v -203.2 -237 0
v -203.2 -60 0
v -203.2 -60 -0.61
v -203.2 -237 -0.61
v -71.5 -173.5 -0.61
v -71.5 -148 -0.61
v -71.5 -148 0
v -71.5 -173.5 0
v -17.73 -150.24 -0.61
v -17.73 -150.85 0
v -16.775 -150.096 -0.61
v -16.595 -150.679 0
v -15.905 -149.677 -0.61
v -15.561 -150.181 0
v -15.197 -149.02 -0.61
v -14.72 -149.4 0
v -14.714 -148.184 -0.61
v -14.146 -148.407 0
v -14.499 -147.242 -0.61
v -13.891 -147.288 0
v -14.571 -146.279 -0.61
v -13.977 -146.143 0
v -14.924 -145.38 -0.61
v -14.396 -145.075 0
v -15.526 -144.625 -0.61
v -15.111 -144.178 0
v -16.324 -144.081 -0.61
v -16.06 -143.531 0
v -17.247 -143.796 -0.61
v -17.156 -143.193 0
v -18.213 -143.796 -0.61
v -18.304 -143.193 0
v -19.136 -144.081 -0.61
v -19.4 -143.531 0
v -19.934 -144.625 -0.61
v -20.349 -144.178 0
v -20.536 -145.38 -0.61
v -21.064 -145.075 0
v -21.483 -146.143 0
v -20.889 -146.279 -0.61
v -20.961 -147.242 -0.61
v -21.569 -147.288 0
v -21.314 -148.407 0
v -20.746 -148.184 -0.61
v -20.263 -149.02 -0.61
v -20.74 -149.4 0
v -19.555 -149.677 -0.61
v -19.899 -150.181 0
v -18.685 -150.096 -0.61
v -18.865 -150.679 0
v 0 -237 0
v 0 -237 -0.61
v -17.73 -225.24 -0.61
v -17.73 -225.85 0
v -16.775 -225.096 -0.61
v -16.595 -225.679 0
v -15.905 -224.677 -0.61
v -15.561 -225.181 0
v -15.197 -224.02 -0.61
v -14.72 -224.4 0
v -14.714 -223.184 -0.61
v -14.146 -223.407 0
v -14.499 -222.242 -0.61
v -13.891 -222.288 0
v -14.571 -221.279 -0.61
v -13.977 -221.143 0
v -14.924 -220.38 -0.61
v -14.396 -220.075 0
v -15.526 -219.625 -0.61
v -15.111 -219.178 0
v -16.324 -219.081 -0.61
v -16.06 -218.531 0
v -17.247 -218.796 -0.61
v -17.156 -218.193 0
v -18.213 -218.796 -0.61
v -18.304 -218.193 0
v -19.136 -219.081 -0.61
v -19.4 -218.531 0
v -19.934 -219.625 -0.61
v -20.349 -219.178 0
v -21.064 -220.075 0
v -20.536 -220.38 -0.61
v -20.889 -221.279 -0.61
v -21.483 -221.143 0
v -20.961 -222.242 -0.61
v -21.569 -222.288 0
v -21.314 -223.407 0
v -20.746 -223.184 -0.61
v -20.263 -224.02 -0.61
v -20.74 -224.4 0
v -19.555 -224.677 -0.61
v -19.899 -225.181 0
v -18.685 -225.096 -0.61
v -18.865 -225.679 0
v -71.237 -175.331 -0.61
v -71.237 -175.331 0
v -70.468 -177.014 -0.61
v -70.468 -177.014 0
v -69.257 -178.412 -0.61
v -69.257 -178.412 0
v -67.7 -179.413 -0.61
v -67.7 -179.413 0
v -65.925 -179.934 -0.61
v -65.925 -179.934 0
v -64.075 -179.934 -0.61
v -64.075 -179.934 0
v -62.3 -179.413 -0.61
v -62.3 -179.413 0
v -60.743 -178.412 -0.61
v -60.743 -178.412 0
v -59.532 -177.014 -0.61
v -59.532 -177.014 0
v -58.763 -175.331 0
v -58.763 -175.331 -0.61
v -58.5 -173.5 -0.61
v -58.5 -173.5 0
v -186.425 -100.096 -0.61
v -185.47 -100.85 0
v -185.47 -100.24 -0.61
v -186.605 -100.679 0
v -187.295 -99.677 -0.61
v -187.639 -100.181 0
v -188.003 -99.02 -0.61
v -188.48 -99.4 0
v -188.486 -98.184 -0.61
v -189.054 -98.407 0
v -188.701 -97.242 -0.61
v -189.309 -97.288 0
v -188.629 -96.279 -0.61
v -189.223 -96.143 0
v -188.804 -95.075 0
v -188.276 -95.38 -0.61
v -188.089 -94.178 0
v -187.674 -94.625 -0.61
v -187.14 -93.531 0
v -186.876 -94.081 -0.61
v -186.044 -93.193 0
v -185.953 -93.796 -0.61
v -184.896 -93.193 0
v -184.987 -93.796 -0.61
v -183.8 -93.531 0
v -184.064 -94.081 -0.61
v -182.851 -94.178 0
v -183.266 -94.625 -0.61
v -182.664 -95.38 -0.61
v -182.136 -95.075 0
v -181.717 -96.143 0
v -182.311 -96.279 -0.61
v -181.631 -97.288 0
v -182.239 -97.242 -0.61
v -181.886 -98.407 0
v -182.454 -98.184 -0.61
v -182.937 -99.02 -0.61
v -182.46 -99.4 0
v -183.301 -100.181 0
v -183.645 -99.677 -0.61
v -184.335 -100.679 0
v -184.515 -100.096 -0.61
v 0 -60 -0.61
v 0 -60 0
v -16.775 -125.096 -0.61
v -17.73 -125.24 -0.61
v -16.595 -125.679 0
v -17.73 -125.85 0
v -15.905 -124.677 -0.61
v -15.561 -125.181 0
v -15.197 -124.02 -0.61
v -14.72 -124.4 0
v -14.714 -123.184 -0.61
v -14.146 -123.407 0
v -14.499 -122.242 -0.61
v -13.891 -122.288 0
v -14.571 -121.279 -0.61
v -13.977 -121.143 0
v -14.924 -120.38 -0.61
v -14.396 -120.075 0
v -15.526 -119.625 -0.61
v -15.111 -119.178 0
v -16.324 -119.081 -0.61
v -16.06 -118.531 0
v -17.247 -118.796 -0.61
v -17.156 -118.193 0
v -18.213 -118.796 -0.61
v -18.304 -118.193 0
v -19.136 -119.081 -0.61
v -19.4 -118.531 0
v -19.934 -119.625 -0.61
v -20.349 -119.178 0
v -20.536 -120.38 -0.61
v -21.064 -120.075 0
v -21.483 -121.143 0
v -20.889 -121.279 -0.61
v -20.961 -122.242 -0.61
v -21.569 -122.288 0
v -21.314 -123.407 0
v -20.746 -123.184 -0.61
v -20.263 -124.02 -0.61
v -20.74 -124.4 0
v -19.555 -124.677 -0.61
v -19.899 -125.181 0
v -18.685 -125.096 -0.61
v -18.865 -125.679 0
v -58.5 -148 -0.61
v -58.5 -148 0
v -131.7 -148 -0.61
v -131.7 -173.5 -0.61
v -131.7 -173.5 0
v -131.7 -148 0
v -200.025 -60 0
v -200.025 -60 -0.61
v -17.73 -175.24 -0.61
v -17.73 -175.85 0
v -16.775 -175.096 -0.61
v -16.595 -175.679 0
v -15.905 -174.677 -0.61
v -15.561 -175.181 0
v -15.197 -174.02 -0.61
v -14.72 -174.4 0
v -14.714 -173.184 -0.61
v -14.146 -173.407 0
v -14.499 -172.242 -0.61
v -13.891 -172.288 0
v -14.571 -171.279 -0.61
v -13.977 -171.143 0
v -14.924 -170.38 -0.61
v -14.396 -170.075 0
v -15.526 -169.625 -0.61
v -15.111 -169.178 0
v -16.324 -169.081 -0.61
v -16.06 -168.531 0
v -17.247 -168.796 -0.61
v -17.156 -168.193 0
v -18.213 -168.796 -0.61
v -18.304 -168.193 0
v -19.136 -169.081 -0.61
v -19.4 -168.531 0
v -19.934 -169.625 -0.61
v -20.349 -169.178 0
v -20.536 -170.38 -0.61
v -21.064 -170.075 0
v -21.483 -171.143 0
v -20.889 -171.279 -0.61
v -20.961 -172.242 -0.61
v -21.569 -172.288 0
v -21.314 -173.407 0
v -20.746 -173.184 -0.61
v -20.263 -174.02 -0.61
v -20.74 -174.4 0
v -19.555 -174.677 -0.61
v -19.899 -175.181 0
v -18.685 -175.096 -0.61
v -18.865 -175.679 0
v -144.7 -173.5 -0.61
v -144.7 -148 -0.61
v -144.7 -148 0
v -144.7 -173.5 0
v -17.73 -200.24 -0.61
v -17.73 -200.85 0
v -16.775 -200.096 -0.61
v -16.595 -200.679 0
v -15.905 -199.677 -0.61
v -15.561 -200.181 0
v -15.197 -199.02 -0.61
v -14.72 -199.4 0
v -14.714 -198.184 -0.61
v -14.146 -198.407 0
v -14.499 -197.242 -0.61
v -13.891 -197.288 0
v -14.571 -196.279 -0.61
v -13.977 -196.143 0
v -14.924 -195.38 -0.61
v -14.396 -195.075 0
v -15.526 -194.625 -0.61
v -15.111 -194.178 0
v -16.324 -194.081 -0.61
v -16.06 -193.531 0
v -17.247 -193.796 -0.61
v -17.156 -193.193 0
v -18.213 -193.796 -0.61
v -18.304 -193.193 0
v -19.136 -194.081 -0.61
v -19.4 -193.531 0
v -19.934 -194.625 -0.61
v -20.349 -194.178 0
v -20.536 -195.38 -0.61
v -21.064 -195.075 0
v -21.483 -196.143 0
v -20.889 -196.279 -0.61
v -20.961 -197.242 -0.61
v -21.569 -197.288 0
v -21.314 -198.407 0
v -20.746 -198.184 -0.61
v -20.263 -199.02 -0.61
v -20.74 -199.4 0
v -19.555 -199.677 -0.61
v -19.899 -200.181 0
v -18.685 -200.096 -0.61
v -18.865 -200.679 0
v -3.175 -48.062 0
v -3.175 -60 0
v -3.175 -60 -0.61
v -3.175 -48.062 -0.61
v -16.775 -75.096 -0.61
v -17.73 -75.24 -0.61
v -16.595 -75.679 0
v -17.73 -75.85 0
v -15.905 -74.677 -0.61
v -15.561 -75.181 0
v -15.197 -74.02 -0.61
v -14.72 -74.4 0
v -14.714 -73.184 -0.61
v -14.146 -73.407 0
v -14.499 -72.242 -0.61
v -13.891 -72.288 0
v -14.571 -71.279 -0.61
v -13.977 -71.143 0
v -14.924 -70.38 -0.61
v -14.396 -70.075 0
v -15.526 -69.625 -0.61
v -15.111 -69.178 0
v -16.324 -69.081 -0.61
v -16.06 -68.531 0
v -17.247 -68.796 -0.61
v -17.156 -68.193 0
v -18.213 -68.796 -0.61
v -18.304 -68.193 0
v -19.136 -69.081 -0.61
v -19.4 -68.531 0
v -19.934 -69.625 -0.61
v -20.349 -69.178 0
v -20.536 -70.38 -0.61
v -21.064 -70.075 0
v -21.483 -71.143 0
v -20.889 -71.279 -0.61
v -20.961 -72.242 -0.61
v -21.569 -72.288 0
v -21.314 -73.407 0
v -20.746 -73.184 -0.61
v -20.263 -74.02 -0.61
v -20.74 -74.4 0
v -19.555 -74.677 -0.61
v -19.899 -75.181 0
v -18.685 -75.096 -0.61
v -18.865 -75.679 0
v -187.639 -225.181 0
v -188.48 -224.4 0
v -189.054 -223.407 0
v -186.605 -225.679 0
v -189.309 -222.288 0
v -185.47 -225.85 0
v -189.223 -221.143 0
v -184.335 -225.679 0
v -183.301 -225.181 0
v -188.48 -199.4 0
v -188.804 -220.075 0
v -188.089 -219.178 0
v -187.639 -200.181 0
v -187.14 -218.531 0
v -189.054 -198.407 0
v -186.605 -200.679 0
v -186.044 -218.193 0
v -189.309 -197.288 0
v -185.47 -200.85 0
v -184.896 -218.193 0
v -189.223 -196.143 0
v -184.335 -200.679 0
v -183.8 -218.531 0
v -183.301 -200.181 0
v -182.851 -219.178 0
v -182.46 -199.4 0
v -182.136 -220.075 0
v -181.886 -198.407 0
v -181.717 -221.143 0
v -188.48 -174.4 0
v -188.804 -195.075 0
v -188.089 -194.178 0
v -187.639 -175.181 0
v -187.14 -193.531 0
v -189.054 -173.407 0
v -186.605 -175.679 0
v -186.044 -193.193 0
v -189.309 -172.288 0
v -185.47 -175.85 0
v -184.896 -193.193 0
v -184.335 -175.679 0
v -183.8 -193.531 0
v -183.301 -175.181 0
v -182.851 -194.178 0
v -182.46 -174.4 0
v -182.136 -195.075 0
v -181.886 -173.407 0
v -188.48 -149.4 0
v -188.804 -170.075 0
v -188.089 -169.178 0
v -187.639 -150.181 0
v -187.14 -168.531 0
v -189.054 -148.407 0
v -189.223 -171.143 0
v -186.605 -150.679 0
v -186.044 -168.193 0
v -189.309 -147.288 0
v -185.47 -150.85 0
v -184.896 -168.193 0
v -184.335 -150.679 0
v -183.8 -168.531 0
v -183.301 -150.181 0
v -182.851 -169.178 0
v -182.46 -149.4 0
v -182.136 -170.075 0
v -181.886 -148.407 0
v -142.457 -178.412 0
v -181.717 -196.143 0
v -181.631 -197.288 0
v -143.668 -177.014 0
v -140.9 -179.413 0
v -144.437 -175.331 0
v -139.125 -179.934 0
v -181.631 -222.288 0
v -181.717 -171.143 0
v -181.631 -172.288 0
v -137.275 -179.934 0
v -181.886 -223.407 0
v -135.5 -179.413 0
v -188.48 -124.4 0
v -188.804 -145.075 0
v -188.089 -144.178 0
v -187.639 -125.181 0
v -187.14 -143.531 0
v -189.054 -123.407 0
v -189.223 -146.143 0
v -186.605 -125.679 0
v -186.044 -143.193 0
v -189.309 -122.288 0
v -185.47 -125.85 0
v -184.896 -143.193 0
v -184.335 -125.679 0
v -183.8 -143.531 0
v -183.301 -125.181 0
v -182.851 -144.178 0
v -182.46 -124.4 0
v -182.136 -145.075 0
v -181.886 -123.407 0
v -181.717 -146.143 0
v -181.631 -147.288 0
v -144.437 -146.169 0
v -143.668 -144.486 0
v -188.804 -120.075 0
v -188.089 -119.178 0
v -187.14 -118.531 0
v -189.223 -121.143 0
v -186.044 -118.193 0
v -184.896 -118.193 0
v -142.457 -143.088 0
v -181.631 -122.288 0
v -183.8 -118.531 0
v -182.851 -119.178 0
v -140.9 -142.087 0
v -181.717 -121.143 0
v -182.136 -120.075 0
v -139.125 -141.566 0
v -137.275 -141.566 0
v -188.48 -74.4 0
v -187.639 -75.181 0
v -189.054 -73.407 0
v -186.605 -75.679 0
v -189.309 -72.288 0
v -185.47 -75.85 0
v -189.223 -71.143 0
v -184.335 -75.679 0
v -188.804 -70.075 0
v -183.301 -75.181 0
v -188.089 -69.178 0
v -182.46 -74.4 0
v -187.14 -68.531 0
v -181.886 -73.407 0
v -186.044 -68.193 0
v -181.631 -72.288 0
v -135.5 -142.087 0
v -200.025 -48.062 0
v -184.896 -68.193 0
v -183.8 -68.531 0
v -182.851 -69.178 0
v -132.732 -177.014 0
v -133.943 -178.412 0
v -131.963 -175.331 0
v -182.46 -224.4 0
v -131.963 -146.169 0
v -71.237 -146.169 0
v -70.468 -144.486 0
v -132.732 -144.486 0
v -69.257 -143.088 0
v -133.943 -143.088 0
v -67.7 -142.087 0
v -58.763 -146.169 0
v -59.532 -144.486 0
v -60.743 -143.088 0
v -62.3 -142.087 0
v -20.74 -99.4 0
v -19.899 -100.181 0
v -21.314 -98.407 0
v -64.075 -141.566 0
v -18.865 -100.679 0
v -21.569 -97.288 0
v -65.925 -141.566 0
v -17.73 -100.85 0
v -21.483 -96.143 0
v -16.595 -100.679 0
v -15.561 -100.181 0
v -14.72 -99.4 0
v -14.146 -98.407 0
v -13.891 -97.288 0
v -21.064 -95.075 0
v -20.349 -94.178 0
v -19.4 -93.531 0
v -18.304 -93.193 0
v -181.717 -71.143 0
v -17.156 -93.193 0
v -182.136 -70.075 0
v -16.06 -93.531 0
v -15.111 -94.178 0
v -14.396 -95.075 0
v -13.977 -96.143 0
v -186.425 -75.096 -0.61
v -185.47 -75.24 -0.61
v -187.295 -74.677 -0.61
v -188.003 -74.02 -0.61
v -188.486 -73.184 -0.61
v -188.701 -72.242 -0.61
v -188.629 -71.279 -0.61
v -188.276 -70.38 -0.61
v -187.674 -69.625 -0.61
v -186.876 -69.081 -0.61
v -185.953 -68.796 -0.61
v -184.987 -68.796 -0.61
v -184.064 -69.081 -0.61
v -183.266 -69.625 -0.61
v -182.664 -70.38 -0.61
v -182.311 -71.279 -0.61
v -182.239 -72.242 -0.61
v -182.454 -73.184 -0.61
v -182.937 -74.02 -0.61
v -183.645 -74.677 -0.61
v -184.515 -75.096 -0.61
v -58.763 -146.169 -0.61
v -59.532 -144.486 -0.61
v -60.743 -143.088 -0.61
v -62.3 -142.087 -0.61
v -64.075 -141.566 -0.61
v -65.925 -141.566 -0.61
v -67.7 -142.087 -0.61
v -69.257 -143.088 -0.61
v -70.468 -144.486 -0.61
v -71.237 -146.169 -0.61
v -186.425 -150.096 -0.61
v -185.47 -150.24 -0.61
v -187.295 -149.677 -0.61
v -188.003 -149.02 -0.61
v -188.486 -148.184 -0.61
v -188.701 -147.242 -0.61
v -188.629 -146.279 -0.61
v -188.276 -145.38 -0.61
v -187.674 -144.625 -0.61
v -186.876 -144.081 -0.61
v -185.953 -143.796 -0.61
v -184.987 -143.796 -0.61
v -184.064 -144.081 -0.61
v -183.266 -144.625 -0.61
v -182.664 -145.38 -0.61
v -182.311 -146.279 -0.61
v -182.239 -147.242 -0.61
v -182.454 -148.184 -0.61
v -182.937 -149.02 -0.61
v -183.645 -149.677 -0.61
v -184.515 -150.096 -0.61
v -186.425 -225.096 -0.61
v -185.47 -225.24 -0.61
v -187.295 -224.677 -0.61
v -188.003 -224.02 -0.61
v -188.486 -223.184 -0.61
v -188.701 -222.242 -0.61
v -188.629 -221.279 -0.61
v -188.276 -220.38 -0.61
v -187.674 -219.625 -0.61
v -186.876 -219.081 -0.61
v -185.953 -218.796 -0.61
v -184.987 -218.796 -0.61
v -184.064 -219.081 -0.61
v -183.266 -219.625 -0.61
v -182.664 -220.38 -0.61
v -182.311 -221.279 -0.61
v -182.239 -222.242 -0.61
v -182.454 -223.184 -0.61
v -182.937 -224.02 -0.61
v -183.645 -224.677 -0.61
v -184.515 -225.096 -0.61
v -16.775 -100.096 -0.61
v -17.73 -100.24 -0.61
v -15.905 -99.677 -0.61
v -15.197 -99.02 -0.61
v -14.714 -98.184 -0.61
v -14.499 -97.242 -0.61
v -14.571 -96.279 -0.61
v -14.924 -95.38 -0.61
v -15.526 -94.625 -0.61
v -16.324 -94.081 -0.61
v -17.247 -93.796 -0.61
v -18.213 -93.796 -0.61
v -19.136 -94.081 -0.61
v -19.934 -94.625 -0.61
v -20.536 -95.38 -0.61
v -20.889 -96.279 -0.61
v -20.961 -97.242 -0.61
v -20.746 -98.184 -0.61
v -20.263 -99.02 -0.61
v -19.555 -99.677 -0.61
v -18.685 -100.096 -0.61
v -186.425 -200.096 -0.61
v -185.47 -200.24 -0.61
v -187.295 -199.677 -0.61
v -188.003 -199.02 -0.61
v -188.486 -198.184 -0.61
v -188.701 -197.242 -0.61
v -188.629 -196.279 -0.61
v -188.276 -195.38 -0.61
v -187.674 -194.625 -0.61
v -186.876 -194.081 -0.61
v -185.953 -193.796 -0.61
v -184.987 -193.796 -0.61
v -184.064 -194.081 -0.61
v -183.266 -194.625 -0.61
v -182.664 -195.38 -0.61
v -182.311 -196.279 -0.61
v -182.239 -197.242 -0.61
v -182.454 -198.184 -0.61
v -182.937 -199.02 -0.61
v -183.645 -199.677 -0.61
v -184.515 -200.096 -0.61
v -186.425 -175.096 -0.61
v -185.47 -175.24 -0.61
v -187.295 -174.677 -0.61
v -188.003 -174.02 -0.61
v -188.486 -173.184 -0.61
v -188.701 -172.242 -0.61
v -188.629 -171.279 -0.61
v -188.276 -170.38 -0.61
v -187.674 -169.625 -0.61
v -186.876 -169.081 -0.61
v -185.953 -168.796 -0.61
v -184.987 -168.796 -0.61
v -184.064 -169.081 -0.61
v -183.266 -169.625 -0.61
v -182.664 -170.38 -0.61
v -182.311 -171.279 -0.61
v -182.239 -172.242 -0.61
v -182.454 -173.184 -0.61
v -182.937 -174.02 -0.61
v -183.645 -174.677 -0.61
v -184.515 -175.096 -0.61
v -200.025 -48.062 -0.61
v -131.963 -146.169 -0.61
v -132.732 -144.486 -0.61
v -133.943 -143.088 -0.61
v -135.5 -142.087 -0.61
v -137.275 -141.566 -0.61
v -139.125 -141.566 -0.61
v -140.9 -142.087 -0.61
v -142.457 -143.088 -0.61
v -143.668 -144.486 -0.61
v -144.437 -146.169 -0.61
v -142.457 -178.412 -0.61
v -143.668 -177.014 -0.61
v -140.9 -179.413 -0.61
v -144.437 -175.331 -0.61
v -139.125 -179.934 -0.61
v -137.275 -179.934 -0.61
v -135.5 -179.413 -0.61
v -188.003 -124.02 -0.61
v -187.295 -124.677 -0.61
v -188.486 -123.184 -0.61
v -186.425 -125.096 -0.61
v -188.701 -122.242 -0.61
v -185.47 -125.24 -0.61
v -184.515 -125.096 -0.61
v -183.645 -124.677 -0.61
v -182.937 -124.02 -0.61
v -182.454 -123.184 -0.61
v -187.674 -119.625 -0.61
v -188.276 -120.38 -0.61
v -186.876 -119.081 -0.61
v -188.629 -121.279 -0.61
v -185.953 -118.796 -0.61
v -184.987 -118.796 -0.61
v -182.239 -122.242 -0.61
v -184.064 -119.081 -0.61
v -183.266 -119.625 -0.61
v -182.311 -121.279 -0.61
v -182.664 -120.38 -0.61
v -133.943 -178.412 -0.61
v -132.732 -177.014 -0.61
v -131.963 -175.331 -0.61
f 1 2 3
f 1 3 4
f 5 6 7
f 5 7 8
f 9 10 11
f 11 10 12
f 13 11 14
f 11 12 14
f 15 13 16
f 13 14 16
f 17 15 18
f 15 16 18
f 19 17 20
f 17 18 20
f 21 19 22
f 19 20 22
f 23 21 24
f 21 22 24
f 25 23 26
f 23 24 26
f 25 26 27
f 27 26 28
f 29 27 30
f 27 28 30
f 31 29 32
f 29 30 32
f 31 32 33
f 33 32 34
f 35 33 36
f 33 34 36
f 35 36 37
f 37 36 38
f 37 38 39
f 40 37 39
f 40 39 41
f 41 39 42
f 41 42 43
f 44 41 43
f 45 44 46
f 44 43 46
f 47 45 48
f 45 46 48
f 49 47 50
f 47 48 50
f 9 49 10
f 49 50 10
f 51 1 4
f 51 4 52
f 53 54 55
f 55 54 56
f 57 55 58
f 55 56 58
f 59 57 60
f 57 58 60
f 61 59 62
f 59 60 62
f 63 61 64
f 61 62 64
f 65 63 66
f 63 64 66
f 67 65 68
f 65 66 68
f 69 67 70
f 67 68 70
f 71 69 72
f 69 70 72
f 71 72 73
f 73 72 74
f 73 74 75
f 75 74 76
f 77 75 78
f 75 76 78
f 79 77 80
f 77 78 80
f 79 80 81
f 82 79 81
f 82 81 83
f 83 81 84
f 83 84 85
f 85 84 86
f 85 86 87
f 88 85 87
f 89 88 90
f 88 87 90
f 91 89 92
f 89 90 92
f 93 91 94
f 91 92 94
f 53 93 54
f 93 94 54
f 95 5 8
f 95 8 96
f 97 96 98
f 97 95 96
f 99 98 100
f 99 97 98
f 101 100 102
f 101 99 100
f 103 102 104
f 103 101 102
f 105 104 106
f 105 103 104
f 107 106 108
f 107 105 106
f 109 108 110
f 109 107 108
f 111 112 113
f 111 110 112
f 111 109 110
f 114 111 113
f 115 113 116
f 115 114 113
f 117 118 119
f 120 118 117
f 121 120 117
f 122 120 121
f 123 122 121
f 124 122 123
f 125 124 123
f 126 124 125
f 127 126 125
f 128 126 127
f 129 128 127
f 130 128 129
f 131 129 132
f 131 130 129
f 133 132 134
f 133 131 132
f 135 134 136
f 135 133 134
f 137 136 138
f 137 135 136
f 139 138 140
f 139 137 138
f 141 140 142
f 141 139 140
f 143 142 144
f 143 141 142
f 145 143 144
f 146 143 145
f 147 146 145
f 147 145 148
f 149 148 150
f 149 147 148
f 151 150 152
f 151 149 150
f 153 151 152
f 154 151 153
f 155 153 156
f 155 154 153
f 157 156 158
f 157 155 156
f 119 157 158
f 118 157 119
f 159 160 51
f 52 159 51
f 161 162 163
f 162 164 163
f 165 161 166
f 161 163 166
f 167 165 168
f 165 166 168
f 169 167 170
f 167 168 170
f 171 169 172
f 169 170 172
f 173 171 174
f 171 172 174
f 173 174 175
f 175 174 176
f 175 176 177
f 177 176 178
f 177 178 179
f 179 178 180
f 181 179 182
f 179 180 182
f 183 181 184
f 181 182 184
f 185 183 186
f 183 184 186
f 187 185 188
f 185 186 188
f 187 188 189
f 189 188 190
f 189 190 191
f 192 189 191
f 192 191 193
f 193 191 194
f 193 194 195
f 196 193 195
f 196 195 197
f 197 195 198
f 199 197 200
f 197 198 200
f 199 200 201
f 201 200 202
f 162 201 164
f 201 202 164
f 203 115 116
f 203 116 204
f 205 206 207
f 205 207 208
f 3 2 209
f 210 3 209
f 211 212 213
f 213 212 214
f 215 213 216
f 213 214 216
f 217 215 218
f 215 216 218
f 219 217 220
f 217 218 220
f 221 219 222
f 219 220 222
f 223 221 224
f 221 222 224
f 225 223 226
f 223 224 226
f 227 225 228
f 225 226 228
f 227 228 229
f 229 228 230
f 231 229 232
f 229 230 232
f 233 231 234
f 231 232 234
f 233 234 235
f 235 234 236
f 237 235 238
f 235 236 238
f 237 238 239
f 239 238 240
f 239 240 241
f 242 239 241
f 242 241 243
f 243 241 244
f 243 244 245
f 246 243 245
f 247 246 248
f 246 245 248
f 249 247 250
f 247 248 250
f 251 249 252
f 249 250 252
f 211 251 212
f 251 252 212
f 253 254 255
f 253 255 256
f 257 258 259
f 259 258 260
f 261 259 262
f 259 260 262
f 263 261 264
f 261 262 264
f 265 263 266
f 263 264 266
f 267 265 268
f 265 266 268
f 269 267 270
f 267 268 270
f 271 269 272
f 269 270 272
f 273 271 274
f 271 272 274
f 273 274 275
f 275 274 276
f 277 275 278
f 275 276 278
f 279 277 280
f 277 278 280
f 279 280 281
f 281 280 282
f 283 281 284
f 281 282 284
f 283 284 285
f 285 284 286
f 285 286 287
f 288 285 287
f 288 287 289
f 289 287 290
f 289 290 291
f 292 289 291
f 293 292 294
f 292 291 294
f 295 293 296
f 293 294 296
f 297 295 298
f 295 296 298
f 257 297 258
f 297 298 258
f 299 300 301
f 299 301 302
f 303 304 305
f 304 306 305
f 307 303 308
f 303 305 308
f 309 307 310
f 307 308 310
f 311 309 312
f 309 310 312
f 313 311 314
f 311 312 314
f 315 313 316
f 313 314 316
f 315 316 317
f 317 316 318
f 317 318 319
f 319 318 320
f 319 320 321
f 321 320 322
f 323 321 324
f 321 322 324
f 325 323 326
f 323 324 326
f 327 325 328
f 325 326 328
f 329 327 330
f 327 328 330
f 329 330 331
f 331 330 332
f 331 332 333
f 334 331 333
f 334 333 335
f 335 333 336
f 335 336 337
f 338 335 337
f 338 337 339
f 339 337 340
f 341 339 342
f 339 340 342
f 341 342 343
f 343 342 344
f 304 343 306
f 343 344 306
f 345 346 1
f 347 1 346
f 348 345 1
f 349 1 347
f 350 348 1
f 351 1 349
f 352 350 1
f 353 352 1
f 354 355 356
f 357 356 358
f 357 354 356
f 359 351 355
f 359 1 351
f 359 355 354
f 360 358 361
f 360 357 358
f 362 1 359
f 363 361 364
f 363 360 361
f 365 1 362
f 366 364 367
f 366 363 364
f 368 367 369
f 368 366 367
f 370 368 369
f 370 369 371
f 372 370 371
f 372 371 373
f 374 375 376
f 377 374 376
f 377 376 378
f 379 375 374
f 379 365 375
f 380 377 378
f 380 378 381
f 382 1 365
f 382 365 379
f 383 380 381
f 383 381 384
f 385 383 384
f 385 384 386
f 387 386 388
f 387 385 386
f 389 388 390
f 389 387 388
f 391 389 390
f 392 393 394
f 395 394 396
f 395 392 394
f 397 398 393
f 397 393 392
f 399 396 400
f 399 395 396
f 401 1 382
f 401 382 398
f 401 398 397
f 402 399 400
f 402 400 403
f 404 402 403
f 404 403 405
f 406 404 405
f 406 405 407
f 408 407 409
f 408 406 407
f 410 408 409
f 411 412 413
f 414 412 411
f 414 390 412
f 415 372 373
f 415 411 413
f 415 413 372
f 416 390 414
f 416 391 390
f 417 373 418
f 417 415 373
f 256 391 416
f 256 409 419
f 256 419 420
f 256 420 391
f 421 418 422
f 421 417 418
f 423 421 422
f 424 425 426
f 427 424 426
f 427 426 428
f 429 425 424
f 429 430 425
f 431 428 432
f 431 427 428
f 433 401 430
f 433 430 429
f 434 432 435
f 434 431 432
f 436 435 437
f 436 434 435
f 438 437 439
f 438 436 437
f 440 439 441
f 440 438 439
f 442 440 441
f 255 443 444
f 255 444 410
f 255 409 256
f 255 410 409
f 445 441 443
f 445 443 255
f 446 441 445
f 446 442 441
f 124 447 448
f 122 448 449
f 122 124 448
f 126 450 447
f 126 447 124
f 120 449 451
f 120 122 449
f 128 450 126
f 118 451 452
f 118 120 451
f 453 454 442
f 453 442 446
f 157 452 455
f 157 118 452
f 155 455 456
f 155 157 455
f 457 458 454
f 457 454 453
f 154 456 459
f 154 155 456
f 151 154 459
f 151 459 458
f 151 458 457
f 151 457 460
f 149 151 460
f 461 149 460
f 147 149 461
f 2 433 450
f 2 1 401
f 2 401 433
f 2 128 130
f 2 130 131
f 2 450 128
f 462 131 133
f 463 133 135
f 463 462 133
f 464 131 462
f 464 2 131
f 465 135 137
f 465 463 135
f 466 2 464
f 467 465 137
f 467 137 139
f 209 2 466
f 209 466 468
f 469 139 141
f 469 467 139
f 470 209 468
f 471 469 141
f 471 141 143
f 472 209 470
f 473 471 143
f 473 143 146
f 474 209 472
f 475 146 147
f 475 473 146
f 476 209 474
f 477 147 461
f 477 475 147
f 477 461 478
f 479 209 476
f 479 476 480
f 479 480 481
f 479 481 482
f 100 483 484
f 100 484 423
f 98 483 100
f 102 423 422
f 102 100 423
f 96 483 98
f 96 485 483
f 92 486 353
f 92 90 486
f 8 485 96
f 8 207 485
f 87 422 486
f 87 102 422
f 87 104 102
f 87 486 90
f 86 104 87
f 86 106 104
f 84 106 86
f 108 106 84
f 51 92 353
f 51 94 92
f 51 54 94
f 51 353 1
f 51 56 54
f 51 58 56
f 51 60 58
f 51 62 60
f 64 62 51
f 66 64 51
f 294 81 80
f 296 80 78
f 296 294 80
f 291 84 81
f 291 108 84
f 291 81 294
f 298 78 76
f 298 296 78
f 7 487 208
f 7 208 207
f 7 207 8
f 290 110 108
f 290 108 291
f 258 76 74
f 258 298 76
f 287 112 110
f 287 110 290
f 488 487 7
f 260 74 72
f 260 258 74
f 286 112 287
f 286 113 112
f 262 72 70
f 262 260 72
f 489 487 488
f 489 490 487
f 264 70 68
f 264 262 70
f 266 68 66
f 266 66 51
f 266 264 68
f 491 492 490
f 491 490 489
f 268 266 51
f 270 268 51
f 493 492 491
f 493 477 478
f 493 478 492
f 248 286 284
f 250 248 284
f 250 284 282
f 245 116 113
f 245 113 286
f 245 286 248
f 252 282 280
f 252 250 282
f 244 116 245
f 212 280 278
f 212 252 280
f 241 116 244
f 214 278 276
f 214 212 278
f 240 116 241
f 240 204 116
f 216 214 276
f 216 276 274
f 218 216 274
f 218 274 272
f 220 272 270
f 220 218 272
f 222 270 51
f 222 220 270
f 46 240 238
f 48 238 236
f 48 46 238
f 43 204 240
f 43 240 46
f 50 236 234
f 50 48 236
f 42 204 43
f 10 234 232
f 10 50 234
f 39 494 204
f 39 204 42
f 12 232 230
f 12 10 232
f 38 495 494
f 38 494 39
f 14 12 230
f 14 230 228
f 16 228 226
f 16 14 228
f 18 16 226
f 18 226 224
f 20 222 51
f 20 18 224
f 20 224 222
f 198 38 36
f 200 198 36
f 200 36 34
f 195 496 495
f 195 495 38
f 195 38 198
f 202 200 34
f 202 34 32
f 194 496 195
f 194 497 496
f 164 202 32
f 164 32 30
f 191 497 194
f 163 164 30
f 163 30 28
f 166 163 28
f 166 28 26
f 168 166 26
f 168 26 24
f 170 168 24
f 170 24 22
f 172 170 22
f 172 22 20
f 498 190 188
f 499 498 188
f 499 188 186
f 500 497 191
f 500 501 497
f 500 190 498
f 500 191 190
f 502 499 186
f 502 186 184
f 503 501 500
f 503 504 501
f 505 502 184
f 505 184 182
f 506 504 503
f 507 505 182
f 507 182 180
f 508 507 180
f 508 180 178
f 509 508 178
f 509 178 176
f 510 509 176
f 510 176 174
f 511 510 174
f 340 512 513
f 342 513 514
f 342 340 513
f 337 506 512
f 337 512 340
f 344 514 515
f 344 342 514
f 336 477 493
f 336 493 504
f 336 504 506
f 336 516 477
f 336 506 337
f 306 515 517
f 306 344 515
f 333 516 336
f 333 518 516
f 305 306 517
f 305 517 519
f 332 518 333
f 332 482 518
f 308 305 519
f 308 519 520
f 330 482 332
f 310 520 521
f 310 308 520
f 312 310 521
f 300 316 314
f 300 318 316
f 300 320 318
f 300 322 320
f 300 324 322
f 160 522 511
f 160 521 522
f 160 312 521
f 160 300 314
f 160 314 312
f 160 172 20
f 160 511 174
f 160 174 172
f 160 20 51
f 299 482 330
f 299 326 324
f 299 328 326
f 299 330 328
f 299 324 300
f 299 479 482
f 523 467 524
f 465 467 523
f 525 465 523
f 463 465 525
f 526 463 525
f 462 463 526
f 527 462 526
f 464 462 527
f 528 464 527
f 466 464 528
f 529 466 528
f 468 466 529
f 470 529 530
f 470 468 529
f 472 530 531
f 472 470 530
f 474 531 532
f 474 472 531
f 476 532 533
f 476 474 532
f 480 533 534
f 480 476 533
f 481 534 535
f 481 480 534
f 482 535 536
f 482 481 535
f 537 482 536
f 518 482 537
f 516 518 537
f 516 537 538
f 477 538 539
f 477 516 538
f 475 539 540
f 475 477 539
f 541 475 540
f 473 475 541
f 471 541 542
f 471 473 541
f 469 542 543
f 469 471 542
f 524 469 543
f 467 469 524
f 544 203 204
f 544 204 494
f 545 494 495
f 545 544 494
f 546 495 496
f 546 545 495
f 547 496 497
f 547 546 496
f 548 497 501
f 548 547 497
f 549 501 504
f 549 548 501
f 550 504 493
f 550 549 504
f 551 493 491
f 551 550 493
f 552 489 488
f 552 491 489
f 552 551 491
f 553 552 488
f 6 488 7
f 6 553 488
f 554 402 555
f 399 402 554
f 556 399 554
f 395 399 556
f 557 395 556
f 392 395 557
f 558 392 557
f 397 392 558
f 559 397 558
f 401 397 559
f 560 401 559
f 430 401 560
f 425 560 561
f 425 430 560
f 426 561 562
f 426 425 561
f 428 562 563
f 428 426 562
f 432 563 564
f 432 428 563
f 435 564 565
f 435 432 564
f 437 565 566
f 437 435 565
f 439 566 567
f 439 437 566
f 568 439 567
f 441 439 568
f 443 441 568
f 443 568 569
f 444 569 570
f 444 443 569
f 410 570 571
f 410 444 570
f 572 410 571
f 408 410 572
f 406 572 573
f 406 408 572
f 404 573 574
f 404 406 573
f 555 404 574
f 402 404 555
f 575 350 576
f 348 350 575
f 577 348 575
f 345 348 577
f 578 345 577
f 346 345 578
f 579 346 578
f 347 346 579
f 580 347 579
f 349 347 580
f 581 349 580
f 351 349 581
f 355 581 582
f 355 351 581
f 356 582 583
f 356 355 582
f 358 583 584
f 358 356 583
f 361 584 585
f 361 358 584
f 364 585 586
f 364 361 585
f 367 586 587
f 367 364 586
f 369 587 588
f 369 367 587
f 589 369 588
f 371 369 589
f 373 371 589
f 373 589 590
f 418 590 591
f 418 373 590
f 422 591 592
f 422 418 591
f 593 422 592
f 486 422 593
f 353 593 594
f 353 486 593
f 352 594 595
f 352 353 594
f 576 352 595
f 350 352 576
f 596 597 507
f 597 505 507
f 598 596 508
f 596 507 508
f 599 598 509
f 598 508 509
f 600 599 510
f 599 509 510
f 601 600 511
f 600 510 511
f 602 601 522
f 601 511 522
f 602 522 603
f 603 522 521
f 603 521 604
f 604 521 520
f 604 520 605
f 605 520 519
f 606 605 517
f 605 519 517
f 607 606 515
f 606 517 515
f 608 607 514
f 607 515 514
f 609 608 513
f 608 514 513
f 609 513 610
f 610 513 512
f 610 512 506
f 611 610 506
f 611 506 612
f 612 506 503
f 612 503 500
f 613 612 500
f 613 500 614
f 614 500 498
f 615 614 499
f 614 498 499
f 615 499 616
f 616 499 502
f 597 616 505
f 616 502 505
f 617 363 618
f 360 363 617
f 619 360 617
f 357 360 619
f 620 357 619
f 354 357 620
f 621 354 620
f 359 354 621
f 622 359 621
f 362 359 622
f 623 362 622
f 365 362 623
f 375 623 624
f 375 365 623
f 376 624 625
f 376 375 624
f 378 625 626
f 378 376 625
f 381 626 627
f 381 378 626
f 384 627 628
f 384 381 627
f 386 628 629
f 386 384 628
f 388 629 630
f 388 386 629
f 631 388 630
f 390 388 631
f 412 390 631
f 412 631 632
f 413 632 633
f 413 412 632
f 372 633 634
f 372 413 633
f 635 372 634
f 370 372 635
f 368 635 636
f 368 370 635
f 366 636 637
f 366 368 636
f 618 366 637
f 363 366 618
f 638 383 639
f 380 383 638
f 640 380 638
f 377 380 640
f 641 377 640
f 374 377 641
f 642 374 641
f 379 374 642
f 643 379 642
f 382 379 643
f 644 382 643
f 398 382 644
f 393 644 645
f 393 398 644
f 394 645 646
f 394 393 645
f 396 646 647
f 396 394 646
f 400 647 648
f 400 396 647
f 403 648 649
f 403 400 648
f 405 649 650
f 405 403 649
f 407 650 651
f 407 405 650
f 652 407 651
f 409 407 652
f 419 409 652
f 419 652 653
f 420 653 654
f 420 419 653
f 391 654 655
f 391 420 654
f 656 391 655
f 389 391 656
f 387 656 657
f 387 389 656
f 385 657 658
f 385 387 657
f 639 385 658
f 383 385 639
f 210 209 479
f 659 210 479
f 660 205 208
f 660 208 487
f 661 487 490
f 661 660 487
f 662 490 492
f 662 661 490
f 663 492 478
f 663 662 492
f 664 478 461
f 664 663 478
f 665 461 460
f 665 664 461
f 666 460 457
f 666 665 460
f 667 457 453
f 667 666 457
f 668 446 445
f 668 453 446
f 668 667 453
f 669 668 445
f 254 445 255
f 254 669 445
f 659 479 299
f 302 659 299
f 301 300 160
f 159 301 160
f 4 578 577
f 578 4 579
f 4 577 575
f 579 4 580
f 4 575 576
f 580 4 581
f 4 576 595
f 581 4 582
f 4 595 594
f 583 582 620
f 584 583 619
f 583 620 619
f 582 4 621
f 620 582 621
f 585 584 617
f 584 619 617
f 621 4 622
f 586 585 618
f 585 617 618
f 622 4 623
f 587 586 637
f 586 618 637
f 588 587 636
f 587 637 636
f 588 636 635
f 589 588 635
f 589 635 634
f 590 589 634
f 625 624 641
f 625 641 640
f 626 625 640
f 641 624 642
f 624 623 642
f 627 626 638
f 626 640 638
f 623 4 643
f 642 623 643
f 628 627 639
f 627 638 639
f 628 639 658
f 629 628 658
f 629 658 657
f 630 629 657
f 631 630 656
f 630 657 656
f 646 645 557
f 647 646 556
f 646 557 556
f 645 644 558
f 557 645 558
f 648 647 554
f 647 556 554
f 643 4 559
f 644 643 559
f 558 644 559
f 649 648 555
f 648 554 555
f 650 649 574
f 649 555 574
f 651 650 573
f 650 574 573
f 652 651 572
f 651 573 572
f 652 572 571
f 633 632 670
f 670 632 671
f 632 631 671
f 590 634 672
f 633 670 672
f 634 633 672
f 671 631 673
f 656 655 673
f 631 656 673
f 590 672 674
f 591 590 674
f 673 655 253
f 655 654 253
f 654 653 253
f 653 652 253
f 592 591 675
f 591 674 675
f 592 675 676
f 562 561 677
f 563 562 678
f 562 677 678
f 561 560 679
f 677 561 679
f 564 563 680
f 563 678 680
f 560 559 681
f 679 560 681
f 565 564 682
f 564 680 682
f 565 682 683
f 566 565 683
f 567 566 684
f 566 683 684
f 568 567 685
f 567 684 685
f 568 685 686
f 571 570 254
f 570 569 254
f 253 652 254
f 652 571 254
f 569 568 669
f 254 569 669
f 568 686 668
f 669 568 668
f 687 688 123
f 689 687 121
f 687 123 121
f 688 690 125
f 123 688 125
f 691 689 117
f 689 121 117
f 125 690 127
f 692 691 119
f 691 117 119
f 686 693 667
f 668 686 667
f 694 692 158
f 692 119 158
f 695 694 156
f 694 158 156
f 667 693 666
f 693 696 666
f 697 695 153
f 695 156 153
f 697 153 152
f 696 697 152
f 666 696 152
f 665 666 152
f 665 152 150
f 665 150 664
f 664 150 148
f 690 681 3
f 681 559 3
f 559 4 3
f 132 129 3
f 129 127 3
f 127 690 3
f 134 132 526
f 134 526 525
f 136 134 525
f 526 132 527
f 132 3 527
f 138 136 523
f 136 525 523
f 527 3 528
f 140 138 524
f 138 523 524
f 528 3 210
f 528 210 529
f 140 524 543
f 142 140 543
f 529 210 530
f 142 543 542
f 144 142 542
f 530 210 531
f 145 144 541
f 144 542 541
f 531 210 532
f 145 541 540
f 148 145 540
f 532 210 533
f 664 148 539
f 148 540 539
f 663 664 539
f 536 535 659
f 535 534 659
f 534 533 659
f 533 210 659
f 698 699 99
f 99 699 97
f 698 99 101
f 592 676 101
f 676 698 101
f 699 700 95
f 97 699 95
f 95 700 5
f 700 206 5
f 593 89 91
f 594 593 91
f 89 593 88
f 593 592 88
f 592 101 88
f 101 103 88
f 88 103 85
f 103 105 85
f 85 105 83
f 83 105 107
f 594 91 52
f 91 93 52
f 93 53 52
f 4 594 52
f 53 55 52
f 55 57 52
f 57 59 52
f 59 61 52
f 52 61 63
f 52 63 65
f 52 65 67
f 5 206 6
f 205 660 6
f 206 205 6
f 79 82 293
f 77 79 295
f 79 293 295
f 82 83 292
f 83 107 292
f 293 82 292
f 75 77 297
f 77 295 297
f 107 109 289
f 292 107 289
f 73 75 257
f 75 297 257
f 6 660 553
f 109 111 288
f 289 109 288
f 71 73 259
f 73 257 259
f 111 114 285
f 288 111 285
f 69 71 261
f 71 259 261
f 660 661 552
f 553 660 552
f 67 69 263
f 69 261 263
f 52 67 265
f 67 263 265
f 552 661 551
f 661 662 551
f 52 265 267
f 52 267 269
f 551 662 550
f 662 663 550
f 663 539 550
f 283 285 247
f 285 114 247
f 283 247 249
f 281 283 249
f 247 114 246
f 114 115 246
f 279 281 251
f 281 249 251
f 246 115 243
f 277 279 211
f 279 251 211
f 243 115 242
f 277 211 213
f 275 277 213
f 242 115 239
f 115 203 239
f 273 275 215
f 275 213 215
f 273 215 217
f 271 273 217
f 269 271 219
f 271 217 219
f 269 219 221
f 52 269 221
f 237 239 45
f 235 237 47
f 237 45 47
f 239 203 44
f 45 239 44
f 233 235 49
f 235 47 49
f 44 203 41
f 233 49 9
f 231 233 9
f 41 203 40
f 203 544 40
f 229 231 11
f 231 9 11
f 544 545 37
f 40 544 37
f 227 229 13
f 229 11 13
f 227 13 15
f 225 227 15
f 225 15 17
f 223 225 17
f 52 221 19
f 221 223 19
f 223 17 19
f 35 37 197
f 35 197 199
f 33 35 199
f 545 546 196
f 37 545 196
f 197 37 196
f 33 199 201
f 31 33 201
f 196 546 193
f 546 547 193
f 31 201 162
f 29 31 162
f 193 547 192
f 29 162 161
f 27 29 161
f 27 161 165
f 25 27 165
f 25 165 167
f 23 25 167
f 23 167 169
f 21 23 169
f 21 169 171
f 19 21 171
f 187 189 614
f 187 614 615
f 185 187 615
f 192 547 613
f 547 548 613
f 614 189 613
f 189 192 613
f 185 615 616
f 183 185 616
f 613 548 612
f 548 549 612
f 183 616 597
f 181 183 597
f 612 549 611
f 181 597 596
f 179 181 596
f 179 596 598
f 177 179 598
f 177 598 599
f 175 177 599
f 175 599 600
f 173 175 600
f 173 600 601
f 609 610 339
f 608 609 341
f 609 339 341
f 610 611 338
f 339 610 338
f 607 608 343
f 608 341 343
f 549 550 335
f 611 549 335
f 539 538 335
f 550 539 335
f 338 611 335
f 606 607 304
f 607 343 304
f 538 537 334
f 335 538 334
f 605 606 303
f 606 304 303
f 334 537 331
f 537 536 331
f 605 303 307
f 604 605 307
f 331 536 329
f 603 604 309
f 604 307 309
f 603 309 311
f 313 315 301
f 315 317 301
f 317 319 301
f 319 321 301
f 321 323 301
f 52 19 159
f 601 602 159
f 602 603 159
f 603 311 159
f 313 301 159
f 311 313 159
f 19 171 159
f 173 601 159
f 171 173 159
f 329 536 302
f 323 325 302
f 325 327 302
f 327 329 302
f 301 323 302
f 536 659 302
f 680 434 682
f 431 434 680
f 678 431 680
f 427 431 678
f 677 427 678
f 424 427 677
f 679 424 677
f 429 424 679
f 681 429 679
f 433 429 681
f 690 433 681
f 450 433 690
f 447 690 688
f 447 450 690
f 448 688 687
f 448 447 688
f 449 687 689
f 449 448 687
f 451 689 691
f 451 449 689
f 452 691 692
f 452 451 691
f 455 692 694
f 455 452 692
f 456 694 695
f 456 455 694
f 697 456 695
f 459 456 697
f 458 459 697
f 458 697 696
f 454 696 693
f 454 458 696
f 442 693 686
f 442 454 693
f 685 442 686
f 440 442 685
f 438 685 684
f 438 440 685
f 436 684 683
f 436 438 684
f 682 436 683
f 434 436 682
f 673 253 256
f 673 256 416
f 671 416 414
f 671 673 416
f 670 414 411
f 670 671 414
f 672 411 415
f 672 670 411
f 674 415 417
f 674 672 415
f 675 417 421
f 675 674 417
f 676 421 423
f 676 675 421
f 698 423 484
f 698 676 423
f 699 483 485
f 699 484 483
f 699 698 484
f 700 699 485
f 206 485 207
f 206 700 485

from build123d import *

# Parameters (mm, degrees)
SKETCH1_W                                      = 203.2
SKETCH1_H                                      = 177
BOSS_EXTRUDE1_DEPTH                            = 0.6096
CUT_EXTRUDE7_DEPTH                             = 313.185220041
SKETCH4_W                                      = 196.85
SKETCH4_H                                      = 0.6096
BOSS_EXTRUDE2_DEPTH                            = 12
SKETCH14_W                                     = 196.85
SKETCH14_H                                     = 11.938
BOSS_EXTRUDE3_DEPTH                            = 0.6096
SKETCH13_W                                     = 196.85
SKETCH13_H                                     = 0.6096
CUT_EXTRUDE9_DEPTH                             = 12
CSK_FOR_M3_FLAT_HEAD_MACHINE_SCREW3_AT_2_COUNT = 2
CSK_FOR_M3_FLAT_HEAD_MACHINE_SCREW3_AT_2_PITCH = 25
CSK_FOR_M3_FLAT_HEAD_MACHINE_SCREW3_AT_3_COUNT = 2
CSK_FOR_M3_FLAT_HEAD_MACHINE_SCREW3_AT_3_PITCH = 50
CSK_FOR_M3_FLAT_HEAD_MACHINE_SCREW3_AT_4_COUNT = 2
CSK_FOR_M3_FLAT_HEAD_MACHINE_SCREW3_AT_4_PITCH = 75
CSK_FOR_M3_FLAT_HEAD_MACHINE_SCREW3_AT_5_COUNT = 2
CSK_FOR_M3_FLAT_HEAD_MACHINE_SCREW3_AT_5_PITCH = 100
CSK_FOR_M3_FLAT_HEAD_MACHINE_SCREW3_AT_6_COUNT = 2
CSK_FOR_M3_FLAT_HEAD_MACHINE_SCREW3_AT_6_PITCH = 125
CSK_FOR_M3_FLAT_HEAD_MACHINE_SCREW3_AT_7_COUNT = 2
CSK_FOR_M3_FLAT_HEAD_MACHINE_SCREW3_AT_7_PITCH = 150


with BuildPart() as part:
    # Sketch1 → Boss-Extrude1 (new body)
    with BuildSketch(Plane(origin=(0, 0, 0), x_dir=(1, 0, 0), z_dir=(0, 0, -1))):
        with Locations((-101.6, 148.5)):
            Rectangle(SKETCH1_W, SKETCH1_H)
    extrude(amount=BOSS_EXTRUDE1_DEPTH)

    # Sketch2 → Cut-Extrude7 (cut, through all)
    with BuildSketch(Plane(origin=(0, 0, -0.6096), x_dir=(1, 0, 0), z_dir=(0, 0, -1))):
        with BuildLine():
            Line((-131.7, 173.5), (-131.7, 148))
            ThreePointArc((-131.7, 148), (-138.2, 141.5), (-144.7, 148))
            Line((-144.7, 148), (-144.7, 173.5))
            ThreePointArc((-144.7, 173.5), (-138.2, 180), (-131.7, 173.5))
        make_face()
        with BuildLine():
            Line((-58.5, 173.5), (-58.5, 148))
            ThreePointArc((-58.5, 148), (-65, 141.5), (-71.5, 148))
            Line((-71.5, 148), (-71.5, 173.5))
            ThreePointArc((-71.5, 173.5), (-65, 180), (-58.5, 173.5))
        make_face()
    extrude(amount=-CUT_EXTRUDE7_DEPTH, mode=Mode.SUBTRACT)

    # Sketch4 → Boss-Extrude2 (add)
    with BuildSketch(Plane.XY):
        with Locations((-101.6, -60.3048)):
            Rectangle(SKETCH4_W, SKETCH4_H)
    extrude(amount=BOSS_EXTRUDE2_DEPTH)

    # Sketch14 → Boss-Extrude3 (add)
    with BuildSketch(Plane.XY):
        with Locations((-101.6, -54.031)):
            Rectangle(SKETCH14_W, SKETCH14_H)
    extrude(amount=-BOSS_EXTRUDE3_DEPTH)

    # Sketch13 → Cut-Extrude9 (cut)
    with BuildSketch(Plane.XY.offset(12)):
        with Locations((-101.6, -60.3048)):
            Rectangle(SKETCH13_W, SKETCH13_H)
    extrude(amount=-CUT_EXTRUDE9_DEPTH, mode=Mode.SUBTRACT)

    # Sketch16 → CSK for M3 Flat Head Machine Screw3 (revolve, cut)
    with BuildSketch(Plane(origin=(-185.47, -222, 0), x_dir=(0, -1, 0), z_dir=(1, 0, 0))):
        Polygon((0, 0), (0, 0.6096), (1.7, 0.6096), (1.7, 2.15), (3.85, 0), align=None)
    csk_for_m3_flat_head_machine_screw3 = revolve(axis=Axis((-185.47, -222, 6.35), (0, 0, -1)), mode=Mode.SUBTRACT)

    # CSK for M3 Flat Head Machine Screw3 at 2: CSK for M3 Flat Head Machine Screw3 ×2
    with Locations(*[(0, i * CSK_FOR_M3_FLAT_HEAD_MACHINE_SCREW3_AT_2_PITCH, 0) for i in range(1, CSK_FOR_M3_FLAT_HEAD_MACHINE_SCREW3_AT_2_COUNT)]):
        add(csk_for_m3_flat_head_machine_screw3, mode=Mode.SUBTRACT)

    # CSK for M3 Flat Head Machine Screw3 at 3: CSK for M3 Flat Head Machine Screw3 ×2
    with Locations(*[(0, i * CSK_FOR_M3_FLAT_HEAD_MACHINE_SCREW3_AT_3_PITCH, 0) for i in range(1, CSK_FOR_M3_FLAT_HEAD_MACHINE_SCREW3_AT_3_COUNT)]):
        add(csk_for_m3_flat_head_machine_screw3, mode=Mode.SUBTRACT)

    # CSK for M3 Flat Head Machine Screw3 at 4: CSK for M3 Flat Head Machine Screw3 ×2
    with Locations(*[(0, i * CSK_FOR_M3_FLAT_HEAD_MACHINE_SCREW3_AT_4_PITCH, 0) for i in range(1, CSK_FOR_M3_FLAT_HEAD_MACHINE_SCREW3_AT_4_COUNT)]):
        add(csk_for_m3_flat_head_machine_screw3, mode=Mode.SUBTRACT)

    # CSK for M3 Flat Head Machine Screw3 at 5: CSK for M3 Flat Head Machine Screw3 ×2
    with Locations(*[(0, i * CSK_FOR_M3_FLAT_HEAD_MACHINE_SCREW3_AT_5_PITCH, 0) for i in range(1, CSK_FOR_M3_FLAT_HEAD_MACHINE_SCREW3_AT_5_COUNT)]):
        add(csk_for_m3_flat_head_machine_screw3, mode=Mode.SUBTRACT)

    # CSK for M3 Flat Head Machine Screw3 at 6: CSK for M3 Flat Head Machine Screw3 ×2
    with Locations(*[(0, i * CSK_FOR_M3_FLAT_HEAD_MACHINE_SCREW3_AT_6_PITCH, 0) for i in range(1, CSK_FOR_M3_FLAT_HEAD_MACHINE_SCREW3_AT_6_COUNT)]):
        add(csk_for_m3_flat_head_machine_screw3, mode=Mode.SUBTRACT)

    # CSK for M3 Flat Head Machine Screw3 at 7: CSK for M3 Flat Head Machine Screw3 ×2
    with Locations(*[(0, i * CSK_FOR_M3_FLAT_HEAD_MACHINE_SCREW3_AT_7_PITCH, 0) for i in range(1, CSK_FOR_M3_FLAT_HEAD_MACHINE_SCREW3_AT_7_COUNT)]):
        add(csk_for_m3_flat_head_machine_screw3, mode=Mode.SUBTRACT)

    # Mirror1: CSK for M3 Flat Head Machine Screw3 across plane
    add(csk_for_m3_flat_head_machine_screw3.mirror(Plane.ZY.offset(101.599999995)), mode=Mode.SUBTRACT)

    # Mirror1 copy 1 sketch → Mirror1 copy 1 (revolve, cut)
    with BuildSketch(Plane(origin=(-17.729999998, -197.000000003, 0), x_dir=(-3.839898042745385e-11, -1.0, 0), z_dir=(-1.0, 3.839898042745385e-11, 0))):
        Polygon((0, 0), (0, -0.6096), (1.7, -0.6096), (1.7, -2.15), (3.85, 0), align=None)
    revolve(axis=Axis((-17.729999998, -197.000000003, 6.35), (0, 0, 1)), mode=Mode.SUBTRACT)

    # Mirror1 copy 2 sketch → Mirror1 copy 2 (revolve, cut)
    with BuildSketch(Plane(origin=(-17.729999998, -172.000000003, 0), x_dir=(-3.839898042745385e-11, -1.0, 0), z_dir=(-1.0, 3.839898042745385e-11, 0))):
        Polygon((0, 0), (0, -0.6096), (1.7, -0.6096), (1.7, -2.15), (3.85, 0), align=None)
    revolve(axis=Axis((-17.729999998, -172.000000003, 6.35), (0, 0, 1)), mode=Mode.SUBTRACT)

    # Mirror1 copy 3 sketch → Mirror1 copy 3 (revolve, cut)
    with BuildSketch(Plane(origin=(-17.729999997, -147.000000003, 0), x_dir=(-3.839898042745385e-11, -1.0, 0), z_dir=(-1.0, 3.839898042745385e-11, 0))):
        Polygon((0, 0), (0, -0.6096), (1.7, -0.6096), (1.7, -2.15), (3.85, 0), align=None)
    revolve(axis=Axis((-17.729999997, -147.000000003, 6.35), (0, 0, 1)), mode=Mode.SUBTRACT)

    # Mirror1 copy 4 sketch → Mirror1 copy 4 (revolve, cut)
    with BuildSketch(Plane(origin=(-17.729999996, -122.000000003, 0), x_dir=(-3.839898042745385e-11, -1.0, 0), z_dir=(-1.0, 3.839898042745385e-11, 0))):
        Polygon((0, 0), (0, -0.6096), (1.7, -0.6096), (1.7, -2.15), (3.85, 0), align=None)
    revolve(axis=Axis((-17.729999996, -122.000000003, 6.35), (0, 0, 1)), mode=Mode.SUBTRACT)

    # Mirror1 copy 5 sketch → Mirror1 copy 5 (revolve, cut)
    with BuildSketch(Plane(origin=(-17.729999995, -97.000000003, 0), x_dir=(-3.839898042745385e-11, -1.0, 0), z_dir=(-1.0, 3.839898042745385e-11, 0))):
        Polygon((0, 0), (0, -0.6096), (1.7, -0.6096), (1.7, -2.15), (3.85, 0), align=None)
    revolve(axis=Axis((-17.729999995, -97.000000003, 6.35), (0, 0, 1)), mode=Mode.SUBTRACT)

    # Mirror1 copy 6 sketch → Mirror1 copy 6 (revolve, cut)
    with BuildSketch(Plane(origin=(-17.729999994, -72.000000003, 0), x_dir=(-3.839898042745385e-11, -1.0, 0), z_dir=(-1.0, 3.839898042745385e-11, 0))):
        Polygon((0, 0), (0, -0.6096), (1.7, -0.6096), (1.7, -2.15), (3.85, 0), align=None)
    revolve(axis=Axis((-17.729999994, -72.000000003, 6.35), (0, 0, 1)), mode=Mode.SUBTRACT)


solid = part.part
